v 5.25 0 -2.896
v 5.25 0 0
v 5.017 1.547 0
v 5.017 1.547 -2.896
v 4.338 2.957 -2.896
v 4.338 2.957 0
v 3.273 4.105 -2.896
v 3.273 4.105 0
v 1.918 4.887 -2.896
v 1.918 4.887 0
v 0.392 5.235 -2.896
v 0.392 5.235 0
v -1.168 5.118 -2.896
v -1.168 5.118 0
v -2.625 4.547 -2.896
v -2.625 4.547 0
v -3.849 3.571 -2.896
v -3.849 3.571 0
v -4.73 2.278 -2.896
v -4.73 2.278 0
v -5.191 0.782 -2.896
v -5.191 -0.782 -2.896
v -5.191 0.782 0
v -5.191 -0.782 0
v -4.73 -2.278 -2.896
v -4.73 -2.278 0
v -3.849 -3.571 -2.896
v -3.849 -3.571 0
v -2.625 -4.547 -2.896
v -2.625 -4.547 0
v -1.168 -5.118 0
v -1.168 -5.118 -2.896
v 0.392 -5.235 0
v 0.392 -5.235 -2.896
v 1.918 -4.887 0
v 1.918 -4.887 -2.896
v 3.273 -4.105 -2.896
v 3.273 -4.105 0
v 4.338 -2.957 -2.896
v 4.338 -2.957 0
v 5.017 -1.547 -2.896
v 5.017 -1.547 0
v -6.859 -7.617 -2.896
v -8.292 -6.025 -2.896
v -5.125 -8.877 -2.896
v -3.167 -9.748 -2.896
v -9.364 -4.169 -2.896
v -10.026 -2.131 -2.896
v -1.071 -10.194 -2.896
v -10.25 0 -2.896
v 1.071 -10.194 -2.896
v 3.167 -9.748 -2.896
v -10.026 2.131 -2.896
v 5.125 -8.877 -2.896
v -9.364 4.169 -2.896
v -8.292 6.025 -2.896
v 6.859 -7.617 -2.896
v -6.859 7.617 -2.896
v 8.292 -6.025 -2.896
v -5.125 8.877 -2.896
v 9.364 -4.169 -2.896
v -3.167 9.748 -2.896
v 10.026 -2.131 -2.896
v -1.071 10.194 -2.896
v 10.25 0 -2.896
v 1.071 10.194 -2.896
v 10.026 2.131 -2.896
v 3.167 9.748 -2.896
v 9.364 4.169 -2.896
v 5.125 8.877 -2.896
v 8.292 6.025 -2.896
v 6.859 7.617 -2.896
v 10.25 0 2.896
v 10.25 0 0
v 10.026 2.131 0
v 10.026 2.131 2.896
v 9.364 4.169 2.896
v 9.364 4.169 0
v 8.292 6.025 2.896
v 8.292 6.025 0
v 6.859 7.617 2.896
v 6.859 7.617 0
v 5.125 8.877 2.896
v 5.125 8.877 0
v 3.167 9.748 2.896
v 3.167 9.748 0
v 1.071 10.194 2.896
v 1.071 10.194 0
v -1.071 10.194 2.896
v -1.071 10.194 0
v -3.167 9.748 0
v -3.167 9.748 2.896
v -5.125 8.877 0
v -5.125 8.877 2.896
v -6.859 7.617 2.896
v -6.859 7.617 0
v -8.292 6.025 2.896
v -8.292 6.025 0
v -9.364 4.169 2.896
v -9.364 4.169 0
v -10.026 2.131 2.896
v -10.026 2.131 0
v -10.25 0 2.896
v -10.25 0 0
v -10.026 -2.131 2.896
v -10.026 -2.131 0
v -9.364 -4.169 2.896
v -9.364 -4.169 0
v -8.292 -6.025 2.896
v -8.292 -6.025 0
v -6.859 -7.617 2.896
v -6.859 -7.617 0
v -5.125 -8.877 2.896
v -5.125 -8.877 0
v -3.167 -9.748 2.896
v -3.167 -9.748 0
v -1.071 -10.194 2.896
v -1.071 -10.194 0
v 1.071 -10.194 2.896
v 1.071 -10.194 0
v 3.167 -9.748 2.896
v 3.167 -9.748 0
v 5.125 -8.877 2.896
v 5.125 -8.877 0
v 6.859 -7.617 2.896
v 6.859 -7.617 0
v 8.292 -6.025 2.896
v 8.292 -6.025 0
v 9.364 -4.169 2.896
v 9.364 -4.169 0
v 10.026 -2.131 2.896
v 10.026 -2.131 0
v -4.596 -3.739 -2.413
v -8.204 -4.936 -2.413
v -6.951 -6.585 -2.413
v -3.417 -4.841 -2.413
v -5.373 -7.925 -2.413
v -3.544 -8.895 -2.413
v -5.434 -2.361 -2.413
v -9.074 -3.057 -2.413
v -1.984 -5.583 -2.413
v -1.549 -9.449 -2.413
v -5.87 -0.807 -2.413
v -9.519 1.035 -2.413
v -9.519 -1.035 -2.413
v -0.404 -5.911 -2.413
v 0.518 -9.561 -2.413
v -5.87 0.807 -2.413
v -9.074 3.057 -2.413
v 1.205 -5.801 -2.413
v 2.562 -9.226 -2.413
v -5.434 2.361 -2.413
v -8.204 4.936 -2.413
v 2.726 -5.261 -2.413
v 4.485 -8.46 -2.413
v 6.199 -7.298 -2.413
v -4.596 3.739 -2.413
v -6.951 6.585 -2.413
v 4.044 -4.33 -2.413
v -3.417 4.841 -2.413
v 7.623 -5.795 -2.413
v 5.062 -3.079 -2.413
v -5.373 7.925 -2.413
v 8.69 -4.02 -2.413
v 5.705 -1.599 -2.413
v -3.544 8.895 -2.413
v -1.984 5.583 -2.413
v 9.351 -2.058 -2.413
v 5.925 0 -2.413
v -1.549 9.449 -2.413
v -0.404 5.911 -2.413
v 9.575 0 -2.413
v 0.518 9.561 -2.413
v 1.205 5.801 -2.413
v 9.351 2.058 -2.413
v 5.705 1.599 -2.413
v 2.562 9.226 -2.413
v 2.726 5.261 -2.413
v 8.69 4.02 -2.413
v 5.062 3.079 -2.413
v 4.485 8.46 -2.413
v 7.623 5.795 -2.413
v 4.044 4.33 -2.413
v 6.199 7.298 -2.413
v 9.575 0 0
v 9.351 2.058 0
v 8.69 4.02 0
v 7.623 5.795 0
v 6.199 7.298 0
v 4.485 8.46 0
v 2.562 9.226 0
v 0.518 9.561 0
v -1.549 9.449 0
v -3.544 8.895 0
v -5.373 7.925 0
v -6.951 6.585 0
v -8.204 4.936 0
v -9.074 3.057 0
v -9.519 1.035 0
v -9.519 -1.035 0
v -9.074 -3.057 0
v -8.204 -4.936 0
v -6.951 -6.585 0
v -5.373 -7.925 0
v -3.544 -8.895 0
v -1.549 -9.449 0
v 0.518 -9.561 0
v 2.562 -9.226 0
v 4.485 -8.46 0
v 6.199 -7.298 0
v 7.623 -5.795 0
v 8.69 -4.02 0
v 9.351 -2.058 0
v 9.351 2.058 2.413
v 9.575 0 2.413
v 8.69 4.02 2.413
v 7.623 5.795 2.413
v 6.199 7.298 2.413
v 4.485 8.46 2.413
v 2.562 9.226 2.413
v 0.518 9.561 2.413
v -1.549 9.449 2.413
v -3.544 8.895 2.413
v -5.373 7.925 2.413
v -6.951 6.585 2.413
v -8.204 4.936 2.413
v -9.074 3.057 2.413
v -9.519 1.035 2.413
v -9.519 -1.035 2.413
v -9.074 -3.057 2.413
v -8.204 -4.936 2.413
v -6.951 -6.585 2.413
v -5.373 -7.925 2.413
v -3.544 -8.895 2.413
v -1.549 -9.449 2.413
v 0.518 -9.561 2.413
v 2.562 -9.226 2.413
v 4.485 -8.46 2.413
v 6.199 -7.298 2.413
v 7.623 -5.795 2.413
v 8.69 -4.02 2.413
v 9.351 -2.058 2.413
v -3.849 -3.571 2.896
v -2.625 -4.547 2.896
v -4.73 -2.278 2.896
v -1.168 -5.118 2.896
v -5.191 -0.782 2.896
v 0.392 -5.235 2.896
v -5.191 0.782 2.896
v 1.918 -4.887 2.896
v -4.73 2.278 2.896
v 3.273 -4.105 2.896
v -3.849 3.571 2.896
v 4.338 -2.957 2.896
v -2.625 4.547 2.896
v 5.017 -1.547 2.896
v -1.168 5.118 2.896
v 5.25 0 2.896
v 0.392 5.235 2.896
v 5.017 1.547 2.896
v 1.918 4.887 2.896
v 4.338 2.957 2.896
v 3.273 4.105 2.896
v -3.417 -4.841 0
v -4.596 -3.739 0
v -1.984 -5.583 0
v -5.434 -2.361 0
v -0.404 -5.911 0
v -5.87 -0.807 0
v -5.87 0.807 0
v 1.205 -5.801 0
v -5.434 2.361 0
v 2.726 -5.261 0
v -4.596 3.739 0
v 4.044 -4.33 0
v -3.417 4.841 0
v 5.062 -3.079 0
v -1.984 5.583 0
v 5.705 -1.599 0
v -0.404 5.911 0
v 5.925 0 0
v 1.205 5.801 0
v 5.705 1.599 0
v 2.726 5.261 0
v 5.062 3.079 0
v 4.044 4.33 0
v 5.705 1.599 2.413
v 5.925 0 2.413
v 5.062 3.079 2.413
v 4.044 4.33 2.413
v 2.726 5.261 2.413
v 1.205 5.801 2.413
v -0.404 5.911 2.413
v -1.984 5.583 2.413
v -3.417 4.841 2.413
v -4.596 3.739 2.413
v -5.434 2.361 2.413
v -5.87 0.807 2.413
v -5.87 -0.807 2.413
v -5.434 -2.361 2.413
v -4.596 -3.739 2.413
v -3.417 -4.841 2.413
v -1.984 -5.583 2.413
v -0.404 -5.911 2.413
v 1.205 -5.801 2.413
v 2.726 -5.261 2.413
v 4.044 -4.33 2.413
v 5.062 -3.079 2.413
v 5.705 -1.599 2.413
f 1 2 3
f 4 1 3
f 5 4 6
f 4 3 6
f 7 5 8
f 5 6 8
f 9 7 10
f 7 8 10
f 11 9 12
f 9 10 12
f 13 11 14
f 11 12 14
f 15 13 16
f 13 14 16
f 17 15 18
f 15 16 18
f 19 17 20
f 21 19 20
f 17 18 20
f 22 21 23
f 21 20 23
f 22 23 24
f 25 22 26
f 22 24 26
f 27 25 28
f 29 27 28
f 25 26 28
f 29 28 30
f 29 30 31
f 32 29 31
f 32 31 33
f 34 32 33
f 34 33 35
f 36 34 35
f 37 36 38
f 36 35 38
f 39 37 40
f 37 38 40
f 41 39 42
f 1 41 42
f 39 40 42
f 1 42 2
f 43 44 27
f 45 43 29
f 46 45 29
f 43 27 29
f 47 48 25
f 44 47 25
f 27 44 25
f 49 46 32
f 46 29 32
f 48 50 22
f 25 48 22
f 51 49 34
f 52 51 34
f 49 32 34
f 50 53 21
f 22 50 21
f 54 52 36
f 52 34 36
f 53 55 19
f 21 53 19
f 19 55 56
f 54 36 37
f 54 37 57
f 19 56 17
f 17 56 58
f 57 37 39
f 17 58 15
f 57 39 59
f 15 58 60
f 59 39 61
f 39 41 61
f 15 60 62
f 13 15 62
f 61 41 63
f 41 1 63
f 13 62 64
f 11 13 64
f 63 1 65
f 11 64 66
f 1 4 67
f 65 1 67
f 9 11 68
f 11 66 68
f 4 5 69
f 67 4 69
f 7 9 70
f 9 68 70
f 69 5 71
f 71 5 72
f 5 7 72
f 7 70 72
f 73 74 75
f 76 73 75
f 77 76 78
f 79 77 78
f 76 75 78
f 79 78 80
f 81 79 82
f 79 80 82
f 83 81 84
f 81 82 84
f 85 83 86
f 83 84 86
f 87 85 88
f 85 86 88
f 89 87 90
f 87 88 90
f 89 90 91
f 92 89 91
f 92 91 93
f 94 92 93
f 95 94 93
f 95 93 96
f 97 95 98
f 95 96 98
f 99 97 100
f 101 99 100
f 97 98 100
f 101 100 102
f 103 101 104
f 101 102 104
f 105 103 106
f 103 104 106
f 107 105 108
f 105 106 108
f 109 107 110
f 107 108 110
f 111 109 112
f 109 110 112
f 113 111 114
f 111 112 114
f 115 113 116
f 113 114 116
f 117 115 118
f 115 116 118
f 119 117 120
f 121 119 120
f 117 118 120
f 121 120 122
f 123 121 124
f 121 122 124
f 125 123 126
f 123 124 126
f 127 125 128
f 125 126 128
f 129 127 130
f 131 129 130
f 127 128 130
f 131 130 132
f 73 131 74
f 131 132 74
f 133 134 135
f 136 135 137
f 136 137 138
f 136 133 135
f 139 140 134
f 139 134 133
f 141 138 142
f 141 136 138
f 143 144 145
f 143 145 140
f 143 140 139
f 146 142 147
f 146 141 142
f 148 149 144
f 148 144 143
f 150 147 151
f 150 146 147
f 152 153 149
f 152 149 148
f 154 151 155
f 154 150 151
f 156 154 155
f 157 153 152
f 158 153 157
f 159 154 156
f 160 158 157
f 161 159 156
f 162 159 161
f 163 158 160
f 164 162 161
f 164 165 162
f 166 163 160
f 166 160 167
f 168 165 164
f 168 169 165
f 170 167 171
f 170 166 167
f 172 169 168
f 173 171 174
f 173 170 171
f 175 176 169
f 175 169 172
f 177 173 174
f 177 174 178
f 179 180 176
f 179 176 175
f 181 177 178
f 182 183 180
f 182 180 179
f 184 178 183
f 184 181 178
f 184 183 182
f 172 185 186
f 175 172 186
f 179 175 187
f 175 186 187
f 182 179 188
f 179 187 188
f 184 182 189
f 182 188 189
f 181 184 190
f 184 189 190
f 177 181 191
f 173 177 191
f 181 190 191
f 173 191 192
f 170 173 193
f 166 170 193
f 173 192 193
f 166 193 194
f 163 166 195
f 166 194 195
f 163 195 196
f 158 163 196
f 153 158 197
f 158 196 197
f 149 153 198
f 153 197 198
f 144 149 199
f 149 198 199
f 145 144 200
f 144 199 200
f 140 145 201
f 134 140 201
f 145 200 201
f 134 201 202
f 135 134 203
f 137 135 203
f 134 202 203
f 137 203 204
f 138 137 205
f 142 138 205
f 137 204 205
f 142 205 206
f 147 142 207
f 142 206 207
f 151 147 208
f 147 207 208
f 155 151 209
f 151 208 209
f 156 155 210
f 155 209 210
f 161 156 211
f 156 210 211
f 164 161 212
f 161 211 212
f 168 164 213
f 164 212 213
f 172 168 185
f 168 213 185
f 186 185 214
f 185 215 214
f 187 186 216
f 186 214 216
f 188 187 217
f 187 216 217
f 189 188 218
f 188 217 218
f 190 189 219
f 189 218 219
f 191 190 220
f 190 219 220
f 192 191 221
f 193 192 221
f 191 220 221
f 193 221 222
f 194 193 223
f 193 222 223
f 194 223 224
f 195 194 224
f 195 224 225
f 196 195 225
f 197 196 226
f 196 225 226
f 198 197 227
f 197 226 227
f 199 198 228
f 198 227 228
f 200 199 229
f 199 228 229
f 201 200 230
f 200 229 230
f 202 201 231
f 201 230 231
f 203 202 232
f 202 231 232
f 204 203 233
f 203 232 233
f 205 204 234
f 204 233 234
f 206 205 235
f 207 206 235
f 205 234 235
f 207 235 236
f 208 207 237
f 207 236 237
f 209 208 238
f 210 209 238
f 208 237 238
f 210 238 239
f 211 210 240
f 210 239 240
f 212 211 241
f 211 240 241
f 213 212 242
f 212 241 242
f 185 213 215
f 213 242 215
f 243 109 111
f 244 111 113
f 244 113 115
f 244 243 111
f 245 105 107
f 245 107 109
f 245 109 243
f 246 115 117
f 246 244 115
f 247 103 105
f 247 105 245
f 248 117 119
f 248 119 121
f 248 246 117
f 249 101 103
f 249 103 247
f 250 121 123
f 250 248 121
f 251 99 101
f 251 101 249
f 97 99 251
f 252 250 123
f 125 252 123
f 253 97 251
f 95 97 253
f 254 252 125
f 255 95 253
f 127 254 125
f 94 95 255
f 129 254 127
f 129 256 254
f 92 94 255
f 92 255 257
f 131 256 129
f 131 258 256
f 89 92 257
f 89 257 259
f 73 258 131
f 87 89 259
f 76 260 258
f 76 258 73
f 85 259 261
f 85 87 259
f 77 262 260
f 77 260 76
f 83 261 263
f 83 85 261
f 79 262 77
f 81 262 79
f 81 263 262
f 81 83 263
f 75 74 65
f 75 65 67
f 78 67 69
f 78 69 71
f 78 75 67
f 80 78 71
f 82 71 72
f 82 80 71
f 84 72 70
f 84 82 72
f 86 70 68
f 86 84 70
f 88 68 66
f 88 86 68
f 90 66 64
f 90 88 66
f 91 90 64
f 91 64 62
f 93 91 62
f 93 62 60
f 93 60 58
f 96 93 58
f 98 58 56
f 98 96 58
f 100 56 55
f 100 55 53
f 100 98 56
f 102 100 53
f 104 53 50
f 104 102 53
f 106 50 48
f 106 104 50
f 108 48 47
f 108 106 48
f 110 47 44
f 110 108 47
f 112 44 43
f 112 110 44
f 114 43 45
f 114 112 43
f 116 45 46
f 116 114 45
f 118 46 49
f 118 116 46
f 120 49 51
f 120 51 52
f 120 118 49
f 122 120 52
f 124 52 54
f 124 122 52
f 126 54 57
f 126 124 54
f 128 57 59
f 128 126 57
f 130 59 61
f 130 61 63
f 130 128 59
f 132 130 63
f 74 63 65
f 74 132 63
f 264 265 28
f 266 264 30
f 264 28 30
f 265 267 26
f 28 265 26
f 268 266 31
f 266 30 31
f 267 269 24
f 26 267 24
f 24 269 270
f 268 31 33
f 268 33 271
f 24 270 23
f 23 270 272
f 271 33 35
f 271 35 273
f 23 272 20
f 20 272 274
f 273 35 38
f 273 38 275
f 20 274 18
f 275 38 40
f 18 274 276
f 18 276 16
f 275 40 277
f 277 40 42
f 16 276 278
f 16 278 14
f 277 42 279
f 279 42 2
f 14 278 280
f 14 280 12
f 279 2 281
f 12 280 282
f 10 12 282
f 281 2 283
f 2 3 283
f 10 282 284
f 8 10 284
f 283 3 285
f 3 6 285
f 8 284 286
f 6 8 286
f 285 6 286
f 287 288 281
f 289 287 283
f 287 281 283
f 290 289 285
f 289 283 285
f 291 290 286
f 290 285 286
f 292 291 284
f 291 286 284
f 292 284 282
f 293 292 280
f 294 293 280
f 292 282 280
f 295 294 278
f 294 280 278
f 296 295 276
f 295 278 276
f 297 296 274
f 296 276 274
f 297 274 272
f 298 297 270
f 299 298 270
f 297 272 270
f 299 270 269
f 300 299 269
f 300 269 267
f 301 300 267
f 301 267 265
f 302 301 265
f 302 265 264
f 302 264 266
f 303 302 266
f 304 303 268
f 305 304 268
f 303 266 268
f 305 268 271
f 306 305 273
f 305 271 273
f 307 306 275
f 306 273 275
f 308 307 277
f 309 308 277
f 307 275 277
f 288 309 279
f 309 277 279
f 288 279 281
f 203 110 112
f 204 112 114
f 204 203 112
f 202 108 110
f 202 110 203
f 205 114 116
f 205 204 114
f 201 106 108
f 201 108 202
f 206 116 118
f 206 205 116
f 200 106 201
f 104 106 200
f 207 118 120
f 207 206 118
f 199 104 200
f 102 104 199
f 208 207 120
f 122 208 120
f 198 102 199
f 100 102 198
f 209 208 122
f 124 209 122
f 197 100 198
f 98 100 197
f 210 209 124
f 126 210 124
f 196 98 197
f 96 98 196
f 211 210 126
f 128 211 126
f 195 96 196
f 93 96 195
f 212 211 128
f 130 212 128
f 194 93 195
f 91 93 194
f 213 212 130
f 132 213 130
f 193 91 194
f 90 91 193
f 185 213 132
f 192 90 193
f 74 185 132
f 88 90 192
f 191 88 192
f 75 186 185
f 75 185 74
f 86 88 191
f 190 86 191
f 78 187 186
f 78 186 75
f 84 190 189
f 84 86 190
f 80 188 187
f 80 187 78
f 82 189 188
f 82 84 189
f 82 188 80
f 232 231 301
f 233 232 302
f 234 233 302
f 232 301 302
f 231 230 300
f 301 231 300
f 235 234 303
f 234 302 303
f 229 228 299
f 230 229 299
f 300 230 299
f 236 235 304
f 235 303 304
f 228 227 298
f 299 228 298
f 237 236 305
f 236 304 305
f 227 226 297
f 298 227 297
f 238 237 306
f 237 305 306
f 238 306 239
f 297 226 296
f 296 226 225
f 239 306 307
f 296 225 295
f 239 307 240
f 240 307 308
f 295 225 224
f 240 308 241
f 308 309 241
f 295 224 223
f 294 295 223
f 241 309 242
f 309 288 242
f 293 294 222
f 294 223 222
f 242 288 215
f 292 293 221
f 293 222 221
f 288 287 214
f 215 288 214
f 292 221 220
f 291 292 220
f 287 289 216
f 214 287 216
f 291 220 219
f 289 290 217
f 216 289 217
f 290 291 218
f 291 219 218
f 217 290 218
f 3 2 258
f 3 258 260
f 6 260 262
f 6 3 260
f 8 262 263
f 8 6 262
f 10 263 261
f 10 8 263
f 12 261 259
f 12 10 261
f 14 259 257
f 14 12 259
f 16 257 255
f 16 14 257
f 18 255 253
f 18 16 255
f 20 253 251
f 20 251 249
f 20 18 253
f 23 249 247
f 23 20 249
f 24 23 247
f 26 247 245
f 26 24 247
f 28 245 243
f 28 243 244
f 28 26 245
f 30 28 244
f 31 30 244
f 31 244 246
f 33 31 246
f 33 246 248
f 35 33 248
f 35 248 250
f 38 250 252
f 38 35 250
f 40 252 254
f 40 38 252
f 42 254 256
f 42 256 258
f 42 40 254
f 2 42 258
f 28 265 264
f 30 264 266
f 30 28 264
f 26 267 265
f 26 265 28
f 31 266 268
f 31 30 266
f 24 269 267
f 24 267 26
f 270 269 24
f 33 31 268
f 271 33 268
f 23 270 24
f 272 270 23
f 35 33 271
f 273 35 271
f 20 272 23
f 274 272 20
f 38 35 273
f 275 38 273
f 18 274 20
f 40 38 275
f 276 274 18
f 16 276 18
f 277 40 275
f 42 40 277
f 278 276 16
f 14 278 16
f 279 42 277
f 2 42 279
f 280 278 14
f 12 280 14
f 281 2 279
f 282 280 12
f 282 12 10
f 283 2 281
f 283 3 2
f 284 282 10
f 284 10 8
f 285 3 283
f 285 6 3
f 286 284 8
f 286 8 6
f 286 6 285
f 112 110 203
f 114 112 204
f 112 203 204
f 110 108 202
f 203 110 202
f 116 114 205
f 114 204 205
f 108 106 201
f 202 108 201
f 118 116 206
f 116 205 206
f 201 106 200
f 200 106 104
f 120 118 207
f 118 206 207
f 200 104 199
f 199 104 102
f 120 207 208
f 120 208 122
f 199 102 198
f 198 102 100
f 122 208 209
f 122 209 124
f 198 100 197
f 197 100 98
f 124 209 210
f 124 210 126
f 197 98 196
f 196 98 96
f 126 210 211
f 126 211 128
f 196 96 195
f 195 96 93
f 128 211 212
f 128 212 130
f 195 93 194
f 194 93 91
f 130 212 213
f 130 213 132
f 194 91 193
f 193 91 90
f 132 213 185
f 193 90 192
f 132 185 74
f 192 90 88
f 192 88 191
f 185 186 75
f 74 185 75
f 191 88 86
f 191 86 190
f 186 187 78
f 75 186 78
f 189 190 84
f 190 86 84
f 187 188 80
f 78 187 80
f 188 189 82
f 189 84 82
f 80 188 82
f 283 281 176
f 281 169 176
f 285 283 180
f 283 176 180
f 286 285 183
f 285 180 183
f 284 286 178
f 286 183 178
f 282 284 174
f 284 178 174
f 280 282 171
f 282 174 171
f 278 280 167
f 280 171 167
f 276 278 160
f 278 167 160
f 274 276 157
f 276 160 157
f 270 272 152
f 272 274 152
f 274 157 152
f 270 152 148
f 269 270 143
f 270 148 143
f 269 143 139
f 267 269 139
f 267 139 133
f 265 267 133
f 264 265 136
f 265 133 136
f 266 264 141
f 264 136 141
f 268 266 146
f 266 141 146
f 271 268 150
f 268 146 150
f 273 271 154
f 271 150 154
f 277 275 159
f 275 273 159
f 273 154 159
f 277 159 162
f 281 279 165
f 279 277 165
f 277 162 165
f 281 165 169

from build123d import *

# Parameters (mm, degrees)
F0_R     = 10.25
F0_R_2   = 5.25
F2_DEPTH = 2.8956
F3_R     = 10.25
F3_R_2   = 5.25
F4_DEPTH = 2.8956
F1_R     = 9.575
F1_R_2   = 5.925
F5_DEPTH = 2.413


with BuildPart() as f2:
    # F0 (on Top) → F2 (new body)
    with BuildSketch(Plane.XY):
        Circle(F0_R)
        Circle(F0_R_2, mode=Mode.SUBTRACT)
    extrude(amount=F2_DEPTH)


with BuildPart() as f4:
    # F3 (on Top) → F4 (new body)
    with BuildSketch(Plane.XY):
        Circle(F3_R)
        Circle(F3_R_2, mode=Mode.SUBTRACT)
    extrude(amount=-F4_DEPTH)


with BuildPart() as f5_tool:
    # F1 (on Top) → F5 (new body, symmetric)
    with BuildSketch(Plane.XY):
        Circle(F1_R)
        Circle(F1_R_2, mode=Mode.SUBTRACT)
    extrude(amount=F5_DEPTH, both=True)


with BuildPart() as f2_1:
    add(f2.part)

    # F5: cut by f5_tool
    add(f5_tool.part, mode=Mode.SUBTRACT)


with BuildPart() as f4_1:
    add(f4.part)

    # F5: cut by f5_tool
    add(f5_tool.part, mode=Mode.SUBTRACT)


solid = Compound([f2_1.part, f4_1.part])
